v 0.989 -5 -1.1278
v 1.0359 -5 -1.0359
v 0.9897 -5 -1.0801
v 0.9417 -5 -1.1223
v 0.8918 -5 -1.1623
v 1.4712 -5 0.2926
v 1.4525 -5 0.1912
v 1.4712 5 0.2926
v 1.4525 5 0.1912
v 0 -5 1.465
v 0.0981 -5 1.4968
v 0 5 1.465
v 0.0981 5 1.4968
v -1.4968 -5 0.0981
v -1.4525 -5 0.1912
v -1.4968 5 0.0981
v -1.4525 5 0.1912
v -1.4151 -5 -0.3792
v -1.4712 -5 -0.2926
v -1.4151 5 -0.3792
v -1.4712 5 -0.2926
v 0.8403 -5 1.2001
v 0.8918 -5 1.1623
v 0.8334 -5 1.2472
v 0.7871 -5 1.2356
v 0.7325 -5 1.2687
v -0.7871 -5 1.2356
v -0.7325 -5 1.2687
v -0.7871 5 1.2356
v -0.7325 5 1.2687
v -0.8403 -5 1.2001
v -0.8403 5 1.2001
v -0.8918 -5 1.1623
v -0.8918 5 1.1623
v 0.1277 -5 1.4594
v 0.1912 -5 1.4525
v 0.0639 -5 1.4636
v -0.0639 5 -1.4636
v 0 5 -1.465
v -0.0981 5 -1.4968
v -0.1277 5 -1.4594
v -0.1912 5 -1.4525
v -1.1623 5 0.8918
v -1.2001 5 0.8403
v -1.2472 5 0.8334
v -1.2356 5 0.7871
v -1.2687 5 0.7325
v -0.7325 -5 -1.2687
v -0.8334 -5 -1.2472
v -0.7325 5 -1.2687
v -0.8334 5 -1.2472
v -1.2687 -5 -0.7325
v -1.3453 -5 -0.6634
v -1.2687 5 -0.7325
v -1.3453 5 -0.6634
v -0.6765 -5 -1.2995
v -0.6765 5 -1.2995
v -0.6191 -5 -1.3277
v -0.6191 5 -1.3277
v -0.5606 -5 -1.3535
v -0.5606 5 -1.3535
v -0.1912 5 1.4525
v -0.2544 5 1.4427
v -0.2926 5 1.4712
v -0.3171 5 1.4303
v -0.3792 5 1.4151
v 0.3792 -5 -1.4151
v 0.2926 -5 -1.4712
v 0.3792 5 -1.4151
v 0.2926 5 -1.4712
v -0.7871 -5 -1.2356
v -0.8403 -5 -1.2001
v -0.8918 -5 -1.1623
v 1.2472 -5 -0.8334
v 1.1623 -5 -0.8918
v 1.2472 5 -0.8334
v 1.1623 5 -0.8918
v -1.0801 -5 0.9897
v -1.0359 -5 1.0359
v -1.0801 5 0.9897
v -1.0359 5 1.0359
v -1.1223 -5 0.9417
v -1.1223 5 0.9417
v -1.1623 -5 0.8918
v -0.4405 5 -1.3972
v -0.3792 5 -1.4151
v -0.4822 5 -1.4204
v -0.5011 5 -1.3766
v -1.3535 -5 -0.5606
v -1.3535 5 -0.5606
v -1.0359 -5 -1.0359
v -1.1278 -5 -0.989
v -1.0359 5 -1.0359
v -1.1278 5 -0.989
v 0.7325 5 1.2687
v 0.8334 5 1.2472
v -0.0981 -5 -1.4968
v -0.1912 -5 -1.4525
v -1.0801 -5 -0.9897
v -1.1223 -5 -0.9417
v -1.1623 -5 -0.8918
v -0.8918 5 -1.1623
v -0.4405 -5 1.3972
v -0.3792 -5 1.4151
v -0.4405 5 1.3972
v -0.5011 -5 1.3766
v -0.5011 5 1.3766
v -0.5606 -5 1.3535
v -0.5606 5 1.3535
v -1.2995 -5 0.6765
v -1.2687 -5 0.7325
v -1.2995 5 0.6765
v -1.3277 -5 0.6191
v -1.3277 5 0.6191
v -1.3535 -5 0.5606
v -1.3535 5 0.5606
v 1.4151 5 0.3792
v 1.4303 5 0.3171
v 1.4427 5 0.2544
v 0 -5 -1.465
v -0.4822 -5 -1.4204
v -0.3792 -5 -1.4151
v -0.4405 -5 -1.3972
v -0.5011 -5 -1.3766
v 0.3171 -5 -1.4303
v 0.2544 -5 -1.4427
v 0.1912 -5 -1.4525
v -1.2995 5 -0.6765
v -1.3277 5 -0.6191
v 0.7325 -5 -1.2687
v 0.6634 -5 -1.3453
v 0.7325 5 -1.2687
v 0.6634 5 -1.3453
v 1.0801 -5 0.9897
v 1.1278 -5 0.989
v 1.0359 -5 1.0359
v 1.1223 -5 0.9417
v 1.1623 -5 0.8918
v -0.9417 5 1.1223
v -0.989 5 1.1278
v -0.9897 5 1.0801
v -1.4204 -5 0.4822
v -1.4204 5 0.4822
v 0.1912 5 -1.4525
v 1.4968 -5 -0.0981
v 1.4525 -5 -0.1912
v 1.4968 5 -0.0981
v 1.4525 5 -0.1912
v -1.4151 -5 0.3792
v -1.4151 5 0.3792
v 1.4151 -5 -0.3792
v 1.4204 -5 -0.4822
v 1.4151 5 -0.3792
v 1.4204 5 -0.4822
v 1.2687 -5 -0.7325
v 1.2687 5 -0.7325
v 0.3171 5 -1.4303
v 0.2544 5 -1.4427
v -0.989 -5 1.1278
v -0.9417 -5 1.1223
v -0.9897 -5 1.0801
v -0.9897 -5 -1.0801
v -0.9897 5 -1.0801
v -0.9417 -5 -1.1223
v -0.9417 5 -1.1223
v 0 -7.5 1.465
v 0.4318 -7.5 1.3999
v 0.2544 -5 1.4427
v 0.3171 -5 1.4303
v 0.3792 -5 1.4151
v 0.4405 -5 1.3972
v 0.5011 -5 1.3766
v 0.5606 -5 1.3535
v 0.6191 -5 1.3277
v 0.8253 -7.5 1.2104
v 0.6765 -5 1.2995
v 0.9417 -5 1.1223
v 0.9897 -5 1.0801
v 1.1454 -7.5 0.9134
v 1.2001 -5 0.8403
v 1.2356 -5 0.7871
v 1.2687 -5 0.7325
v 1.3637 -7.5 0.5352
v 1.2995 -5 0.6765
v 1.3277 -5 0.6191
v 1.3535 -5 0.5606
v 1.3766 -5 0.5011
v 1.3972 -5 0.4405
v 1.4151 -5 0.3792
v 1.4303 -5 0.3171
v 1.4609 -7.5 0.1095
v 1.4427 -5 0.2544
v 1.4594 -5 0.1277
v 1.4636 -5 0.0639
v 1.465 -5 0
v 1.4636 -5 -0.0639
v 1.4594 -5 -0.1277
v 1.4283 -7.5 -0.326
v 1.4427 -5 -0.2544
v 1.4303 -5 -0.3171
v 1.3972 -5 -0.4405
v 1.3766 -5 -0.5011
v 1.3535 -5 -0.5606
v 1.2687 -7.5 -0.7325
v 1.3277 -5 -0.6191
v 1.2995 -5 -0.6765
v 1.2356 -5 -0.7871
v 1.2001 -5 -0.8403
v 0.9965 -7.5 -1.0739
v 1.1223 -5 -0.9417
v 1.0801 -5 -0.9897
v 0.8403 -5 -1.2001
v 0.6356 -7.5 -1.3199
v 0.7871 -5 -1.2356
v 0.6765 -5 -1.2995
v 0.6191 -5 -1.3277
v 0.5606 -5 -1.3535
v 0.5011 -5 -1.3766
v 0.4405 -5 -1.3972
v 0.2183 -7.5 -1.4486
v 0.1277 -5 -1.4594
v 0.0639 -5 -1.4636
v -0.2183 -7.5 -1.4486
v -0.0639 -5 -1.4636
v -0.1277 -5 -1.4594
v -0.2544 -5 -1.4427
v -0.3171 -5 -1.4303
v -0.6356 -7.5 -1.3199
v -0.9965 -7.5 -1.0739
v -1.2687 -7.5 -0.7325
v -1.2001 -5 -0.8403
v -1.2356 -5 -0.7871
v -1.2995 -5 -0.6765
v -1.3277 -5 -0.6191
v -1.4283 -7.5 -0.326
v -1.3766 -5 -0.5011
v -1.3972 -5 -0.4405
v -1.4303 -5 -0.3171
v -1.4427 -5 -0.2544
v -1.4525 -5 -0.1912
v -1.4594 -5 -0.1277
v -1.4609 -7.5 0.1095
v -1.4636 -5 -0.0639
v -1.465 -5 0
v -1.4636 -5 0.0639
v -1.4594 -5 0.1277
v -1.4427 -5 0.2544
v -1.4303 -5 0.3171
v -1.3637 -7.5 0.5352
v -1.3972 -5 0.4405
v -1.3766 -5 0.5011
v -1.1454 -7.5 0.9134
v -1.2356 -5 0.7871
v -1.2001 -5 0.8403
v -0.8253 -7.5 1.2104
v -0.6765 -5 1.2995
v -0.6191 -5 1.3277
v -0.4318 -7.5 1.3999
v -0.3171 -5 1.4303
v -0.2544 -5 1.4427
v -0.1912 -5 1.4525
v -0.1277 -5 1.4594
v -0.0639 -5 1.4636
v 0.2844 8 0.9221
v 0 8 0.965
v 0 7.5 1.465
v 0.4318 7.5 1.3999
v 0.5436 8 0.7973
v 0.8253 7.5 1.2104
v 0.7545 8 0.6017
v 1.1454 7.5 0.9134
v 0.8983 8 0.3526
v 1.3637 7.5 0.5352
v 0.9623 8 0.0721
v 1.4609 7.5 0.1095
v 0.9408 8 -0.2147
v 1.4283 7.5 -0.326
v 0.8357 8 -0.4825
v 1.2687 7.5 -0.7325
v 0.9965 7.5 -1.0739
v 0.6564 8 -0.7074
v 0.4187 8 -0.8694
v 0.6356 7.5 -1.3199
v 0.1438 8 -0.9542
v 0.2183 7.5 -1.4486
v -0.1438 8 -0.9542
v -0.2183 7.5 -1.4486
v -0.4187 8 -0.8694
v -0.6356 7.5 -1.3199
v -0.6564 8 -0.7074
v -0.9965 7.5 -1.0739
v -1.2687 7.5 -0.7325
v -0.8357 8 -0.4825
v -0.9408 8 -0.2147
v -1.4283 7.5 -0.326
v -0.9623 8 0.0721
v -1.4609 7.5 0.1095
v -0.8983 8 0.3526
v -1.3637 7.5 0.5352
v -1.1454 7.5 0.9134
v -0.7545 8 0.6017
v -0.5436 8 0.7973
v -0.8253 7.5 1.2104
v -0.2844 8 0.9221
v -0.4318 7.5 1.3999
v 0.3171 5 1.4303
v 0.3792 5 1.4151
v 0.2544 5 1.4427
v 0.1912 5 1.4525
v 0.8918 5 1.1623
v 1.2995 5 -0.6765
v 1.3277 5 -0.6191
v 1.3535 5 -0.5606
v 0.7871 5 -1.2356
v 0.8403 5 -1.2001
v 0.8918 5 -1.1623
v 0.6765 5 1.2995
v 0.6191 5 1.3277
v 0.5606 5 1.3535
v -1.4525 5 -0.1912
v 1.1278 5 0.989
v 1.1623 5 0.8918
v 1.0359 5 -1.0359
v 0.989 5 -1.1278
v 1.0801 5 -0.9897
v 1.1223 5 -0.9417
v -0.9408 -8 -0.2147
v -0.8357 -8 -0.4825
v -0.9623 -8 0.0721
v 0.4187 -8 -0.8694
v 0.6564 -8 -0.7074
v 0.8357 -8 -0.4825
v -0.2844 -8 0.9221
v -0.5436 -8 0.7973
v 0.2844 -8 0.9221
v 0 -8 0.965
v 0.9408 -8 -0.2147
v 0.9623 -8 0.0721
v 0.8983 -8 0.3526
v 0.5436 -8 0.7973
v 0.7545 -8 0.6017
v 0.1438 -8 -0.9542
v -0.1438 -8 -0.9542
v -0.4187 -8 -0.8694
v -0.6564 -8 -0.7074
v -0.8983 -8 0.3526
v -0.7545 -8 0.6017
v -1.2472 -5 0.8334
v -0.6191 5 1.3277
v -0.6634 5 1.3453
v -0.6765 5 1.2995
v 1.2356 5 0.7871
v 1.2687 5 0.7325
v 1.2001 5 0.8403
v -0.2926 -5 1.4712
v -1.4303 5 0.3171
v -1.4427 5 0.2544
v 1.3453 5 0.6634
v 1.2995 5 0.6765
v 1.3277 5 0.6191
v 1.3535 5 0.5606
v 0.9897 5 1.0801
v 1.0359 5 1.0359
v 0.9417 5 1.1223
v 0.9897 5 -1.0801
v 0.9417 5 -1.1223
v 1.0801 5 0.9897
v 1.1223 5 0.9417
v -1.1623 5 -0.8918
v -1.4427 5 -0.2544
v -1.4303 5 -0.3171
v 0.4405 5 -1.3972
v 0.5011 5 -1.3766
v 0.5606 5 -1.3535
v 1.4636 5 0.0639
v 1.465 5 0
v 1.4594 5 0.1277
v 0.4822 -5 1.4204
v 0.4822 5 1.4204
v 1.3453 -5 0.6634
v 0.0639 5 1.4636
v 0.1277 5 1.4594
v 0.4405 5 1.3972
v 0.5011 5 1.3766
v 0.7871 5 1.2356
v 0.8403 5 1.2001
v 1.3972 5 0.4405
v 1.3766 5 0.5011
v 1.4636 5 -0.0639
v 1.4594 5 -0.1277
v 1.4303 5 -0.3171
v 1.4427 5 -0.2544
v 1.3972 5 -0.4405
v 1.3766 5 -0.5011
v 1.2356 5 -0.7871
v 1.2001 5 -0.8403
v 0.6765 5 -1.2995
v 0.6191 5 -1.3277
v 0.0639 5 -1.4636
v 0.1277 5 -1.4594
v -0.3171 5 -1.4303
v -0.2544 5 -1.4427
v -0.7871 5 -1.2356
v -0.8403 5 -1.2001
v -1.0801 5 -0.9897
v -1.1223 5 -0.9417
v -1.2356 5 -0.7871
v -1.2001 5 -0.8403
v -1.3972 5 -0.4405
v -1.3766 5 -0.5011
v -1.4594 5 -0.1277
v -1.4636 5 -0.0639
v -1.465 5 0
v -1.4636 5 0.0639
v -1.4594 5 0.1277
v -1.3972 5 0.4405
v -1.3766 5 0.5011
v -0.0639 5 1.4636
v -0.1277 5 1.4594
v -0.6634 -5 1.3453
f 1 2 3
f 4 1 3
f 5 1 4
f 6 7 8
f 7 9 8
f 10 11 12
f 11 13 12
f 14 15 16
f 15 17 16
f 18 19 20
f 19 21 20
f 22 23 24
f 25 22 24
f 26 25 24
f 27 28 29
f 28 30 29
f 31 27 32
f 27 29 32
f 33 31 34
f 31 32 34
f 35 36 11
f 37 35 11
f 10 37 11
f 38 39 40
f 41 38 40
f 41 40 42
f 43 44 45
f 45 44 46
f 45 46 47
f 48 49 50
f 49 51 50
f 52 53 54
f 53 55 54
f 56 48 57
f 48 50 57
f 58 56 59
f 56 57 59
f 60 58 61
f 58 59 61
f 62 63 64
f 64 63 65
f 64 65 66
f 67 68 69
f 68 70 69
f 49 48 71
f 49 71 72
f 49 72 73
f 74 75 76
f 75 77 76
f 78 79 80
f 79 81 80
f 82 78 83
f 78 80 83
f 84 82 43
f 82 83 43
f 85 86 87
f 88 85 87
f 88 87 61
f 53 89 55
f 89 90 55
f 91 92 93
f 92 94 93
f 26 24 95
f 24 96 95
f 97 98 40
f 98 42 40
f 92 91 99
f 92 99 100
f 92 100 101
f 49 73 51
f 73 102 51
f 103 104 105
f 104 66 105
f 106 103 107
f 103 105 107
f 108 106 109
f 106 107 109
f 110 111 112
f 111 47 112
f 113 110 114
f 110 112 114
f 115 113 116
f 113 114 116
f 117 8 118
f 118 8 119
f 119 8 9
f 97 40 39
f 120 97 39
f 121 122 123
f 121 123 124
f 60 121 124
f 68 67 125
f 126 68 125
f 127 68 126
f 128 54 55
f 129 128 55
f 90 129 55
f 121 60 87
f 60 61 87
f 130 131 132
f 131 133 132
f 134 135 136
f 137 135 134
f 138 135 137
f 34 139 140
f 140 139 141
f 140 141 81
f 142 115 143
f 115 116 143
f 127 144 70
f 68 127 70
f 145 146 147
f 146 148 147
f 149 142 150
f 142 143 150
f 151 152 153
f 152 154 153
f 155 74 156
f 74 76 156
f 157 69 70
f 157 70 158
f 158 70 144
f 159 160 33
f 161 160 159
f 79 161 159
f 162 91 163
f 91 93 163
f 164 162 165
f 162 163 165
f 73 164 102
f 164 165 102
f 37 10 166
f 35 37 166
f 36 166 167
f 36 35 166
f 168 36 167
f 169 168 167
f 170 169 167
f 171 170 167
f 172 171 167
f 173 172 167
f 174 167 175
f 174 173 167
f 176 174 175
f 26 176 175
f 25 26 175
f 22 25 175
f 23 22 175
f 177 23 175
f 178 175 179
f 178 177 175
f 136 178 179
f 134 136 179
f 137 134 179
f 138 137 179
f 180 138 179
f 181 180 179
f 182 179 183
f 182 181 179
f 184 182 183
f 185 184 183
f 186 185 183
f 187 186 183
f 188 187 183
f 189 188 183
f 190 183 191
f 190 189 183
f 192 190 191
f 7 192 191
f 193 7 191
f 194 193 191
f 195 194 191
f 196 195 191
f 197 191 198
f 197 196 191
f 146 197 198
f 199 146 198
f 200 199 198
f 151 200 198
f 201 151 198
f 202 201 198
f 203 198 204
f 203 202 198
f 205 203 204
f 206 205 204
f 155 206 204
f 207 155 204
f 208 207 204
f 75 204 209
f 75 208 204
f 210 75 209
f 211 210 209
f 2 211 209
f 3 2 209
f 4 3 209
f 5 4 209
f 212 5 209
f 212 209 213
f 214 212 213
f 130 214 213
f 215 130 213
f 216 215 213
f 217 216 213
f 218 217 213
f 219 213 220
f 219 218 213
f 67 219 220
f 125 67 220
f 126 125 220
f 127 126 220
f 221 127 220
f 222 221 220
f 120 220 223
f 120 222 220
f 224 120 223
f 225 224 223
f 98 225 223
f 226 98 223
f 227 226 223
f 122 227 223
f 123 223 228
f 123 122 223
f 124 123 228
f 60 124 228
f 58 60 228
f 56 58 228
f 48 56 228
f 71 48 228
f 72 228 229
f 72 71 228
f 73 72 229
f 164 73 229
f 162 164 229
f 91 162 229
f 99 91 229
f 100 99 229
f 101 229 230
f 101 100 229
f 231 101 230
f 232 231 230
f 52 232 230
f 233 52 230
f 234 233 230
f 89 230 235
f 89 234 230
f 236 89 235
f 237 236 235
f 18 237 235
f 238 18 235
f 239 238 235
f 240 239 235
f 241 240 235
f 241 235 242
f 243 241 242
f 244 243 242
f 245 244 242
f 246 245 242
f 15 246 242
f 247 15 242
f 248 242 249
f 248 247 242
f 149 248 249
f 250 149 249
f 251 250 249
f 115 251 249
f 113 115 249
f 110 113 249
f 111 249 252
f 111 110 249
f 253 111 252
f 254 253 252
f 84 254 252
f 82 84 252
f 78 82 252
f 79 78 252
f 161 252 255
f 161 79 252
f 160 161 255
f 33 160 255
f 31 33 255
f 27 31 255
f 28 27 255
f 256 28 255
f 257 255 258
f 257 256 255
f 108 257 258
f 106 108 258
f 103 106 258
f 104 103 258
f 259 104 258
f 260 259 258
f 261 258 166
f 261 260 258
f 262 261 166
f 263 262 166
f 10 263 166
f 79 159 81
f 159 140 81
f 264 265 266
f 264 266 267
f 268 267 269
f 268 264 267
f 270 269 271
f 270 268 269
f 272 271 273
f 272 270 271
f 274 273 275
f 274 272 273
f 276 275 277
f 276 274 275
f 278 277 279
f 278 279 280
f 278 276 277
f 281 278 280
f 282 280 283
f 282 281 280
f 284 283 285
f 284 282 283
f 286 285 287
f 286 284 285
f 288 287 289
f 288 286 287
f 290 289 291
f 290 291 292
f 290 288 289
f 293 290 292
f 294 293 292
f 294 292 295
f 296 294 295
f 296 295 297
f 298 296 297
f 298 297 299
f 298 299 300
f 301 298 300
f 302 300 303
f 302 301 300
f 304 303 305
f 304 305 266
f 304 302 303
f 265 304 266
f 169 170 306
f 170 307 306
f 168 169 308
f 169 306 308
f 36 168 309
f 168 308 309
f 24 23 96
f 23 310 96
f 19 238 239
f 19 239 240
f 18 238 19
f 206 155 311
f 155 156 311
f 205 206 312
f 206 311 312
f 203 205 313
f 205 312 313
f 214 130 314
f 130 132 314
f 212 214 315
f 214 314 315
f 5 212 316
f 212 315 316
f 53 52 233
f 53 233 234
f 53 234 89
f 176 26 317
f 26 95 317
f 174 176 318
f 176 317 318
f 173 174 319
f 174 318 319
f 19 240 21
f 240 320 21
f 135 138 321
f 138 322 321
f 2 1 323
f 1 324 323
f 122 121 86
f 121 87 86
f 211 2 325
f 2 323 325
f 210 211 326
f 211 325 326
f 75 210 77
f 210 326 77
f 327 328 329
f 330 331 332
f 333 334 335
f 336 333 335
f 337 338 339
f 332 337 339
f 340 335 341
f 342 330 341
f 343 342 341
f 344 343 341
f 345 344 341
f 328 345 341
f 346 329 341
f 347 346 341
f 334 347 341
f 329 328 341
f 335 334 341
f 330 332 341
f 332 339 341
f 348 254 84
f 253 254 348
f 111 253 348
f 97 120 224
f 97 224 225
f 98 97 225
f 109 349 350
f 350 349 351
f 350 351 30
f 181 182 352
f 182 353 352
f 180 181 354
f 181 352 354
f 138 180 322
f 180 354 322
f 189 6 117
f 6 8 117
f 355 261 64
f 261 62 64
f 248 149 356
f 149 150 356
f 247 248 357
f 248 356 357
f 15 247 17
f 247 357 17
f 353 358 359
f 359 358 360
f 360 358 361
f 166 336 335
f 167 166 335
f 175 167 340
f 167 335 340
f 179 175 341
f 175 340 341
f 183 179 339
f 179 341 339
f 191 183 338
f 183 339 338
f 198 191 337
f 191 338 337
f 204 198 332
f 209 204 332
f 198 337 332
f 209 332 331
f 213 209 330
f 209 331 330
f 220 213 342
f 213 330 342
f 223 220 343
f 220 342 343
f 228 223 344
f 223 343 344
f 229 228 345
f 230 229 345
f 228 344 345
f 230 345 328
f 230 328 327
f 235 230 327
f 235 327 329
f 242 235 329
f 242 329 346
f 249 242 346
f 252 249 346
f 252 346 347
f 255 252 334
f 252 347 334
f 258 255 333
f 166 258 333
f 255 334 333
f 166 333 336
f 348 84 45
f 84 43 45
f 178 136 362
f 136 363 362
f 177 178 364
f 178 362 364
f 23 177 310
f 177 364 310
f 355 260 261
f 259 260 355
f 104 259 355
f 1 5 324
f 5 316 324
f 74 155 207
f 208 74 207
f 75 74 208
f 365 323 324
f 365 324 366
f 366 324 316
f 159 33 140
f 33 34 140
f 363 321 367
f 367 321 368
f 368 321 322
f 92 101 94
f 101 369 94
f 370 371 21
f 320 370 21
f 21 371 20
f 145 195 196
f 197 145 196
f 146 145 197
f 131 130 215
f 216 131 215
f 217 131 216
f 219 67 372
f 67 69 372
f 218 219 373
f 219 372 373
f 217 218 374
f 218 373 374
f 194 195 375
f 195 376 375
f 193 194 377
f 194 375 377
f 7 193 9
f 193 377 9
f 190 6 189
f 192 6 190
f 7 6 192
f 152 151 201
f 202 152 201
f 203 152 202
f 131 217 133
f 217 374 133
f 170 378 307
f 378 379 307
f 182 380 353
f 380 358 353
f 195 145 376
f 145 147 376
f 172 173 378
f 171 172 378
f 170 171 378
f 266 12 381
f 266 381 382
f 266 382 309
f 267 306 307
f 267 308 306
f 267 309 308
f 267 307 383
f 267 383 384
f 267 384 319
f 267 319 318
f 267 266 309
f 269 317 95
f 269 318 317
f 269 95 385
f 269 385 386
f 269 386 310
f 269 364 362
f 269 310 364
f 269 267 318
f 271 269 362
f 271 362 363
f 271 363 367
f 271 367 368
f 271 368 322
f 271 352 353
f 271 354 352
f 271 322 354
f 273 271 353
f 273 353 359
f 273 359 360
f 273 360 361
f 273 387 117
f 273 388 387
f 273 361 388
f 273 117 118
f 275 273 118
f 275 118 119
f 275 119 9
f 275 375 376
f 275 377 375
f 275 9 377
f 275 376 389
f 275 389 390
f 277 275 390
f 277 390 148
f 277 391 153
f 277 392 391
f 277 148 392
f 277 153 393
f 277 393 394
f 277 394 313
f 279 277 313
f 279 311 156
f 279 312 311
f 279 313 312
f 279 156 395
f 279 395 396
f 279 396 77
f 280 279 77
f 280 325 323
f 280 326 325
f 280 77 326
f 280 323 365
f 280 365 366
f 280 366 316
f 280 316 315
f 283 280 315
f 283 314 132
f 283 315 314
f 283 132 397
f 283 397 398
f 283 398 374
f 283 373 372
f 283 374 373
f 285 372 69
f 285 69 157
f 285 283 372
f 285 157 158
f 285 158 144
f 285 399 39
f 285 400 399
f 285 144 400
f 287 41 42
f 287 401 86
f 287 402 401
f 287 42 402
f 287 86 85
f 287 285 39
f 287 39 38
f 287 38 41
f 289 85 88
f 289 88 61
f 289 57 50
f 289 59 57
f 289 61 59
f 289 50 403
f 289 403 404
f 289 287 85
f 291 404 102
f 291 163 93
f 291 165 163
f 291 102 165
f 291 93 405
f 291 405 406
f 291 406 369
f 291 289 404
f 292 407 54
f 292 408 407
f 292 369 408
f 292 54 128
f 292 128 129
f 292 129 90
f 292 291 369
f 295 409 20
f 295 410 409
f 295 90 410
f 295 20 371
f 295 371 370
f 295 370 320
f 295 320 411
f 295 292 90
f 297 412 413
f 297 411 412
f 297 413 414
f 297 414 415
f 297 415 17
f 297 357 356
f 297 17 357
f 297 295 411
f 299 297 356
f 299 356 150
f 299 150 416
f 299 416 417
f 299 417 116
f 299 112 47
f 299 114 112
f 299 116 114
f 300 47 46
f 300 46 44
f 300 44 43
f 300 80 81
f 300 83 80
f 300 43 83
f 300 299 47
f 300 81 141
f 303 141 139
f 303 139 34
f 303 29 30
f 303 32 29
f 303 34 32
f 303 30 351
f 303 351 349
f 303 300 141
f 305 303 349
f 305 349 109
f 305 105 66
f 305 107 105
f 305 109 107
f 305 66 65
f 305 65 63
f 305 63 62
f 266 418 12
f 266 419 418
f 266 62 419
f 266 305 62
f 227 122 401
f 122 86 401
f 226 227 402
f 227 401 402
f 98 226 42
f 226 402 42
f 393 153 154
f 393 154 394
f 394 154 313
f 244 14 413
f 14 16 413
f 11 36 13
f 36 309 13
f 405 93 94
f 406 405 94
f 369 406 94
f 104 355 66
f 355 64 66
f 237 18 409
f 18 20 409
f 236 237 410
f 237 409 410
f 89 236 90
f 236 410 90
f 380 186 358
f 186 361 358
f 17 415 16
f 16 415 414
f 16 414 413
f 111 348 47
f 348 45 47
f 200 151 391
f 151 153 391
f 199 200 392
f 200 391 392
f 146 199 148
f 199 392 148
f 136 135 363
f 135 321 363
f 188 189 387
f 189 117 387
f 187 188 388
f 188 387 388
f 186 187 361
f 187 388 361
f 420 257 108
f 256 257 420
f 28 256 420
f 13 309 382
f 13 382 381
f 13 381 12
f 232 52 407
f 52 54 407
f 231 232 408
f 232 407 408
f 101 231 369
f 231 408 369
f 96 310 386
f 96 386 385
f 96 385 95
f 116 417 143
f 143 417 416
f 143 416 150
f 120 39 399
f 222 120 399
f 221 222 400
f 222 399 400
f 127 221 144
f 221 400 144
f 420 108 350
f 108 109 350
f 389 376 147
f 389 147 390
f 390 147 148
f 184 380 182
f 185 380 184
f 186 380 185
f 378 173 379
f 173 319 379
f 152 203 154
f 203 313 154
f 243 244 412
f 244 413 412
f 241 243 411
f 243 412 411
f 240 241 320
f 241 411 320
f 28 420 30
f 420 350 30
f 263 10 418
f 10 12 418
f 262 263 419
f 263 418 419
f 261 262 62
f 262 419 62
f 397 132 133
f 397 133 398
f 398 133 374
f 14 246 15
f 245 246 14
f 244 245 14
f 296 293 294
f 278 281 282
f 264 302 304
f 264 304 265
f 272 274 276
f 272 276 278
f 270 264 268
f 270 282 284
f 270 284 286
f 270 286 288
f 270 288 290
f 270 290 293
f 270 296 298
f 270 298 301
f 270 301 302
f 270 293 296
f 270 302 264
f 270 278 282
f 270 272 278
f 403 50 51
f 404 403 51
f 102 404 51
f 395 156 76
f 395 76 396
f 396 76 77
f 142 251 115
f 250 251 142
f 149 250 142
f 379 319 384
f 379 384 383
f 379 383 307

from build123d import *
from build123d.topology import SkipClean

# Parameters (mm, degrees)
SKETCH1_R      = 1.465
EXTRUDE1_DEPTH = 8
CHAMFER1_SIZE  = 0.5
EXTRUDE2_DEPTH = 5


with BuildPart() as part:
    # Sketch1 → Extrude1 (new, symmetric)
    with BuildSketch(Plane(origin=(0, 0, 0), x_dir=(1, 0, 0), z_dir=(0, 1, 0))):
        with Locations(Location((0, 0, 0), (0, 0, 270))):
            Circle(SKETCH1_R)
    extrude(amount=EXTRUDE1_DEPTH, both=True)

    # Chamfer1
    chamfer1_edges = [part.edges().sort_by_distance(p)[0] for p in [
        (0, -8, -1.465),
        (0, 8, -1.465),
    ]]
    chamfer(chamfer1_edges, length=CHAMFER1_SIZE)

    # Sketch2 → Extrude2 (add, symmetric)
    with SkipClean():  # the faces are left unmerged after this step: merging them gives an invalid solid
        with BuildSketch(Plane(origin=(0, 0, 0), x_dir=(1, 0, 0), z_dir=(0, 1, 0))):
            with BuildLine():
                Line((0.191220872, 1.452466722), (0.292635483, 1.471177921))
                Line((0.292635483, 1.471177921), (0.379169901, 1.415081336))
                ThreePointArc((0.379169901, 1.415081336), (0.470908817, 1.38725264), (0.560631228, 1.353483515))
                Line((0.560631228, 1.353483515), (0.663433035, 1.345309112))
                Line((0.663433035, 1.345309112), (0.7325, 1.268727217))
                ThreePointArc((0.7325, 1.268727217), (0.813910391, 1.218102982), (0.891835493, 1.162262644))
                Line((0.891835493, 1.162262644), (0.989018723, 1.127759711))
                Line((0.989018723, 1.127759711), (1.035911434, 1.035911434))
                ThreePointArc((1.035911434, 1.035911434), (1.101445318, 0.965941619), (1.162262644, 0.891835493))
                Line((1.162262644, 0.891835493), (1.247204418, 0.83335535))
                Line((1.247204418, 0.83335535), (1.268727217, 0.7325))
                ThreePointArc((1.268727217, 0.7325), (1.313918566, 0.647952931), (1.353483515, 0.560631228))
                Line((1.353483515, 0.560631228), (1.420395194, 0.482159198))
                Line((1.420395194, 0.482159198), (1.415081336, 0.379169901))
                ThreePointArc((1.415081336, 0.379169901), (1.436850436, 0.285807322), (1.452466722, 0.191220872))
                Line((1.452466722, 0.191220872), (1.496788385, 0.098104694))
                Line((1.496788385, 0.098104694), (1.465, 0))
                ThreePointArc((1.465, 0), (1.461863323, -0.095815584), (1.452466722, -0.191220872))
                Line((1.452466722, -0.191220872), (1.471177921, -0.292635483))
                Line((1.471177921, -0.292635483), (1.415081336, -0.379169901))
                ThreePointArc((1.415081336, -0.379169901), (1.38725264, -0.470908817), (1.353483515, -0.560631228))
                Line((1.353483515, -0.560631228), (1.345309112, -0.663433035))
                Line((1.345309112, -0.663433035), (1.268727217, -0.7325))
                ThreePointArc((1.268727217, -0.7325), (1.218102982, -0.813910391), (1.162262644, -0.891835493))
                Line((1.162262644, -0.891835493), (1.127759711, -0.989018723))
                Line((1.127759711, -0.989018723), (1.035911434, -1.035911434))
                ThreePointArc((1.035911434, -1.035911434), (0.965941619, -1.101445318), (0.891835493, -1.162262644))
                Line((0.891835493, -1.162262644), (0.83335535, -1.247204418))
                Line((0.83335535, -1.247204418), (0.7325, -1.268727217))
                ThreePointArc((0.7325, -1.268727217), (0.647952931, -1.313918566), (0.560631228, -1.353483515))
                Line((0.560631228, -1.353483515), (0.482159198, -1.420395194))
                Line((0.482159198, -1.420395194), (0.379169901, -1.415081336))
                ThreePointArc((0.379169901, -1.415081336), (0.285807322, -1.436850436), (0.191220872, -1.452466722))
                Line((0.191220872, -1.452466722), (0.098104694, -1.496788385))
                Line((0.098104694, -1.496788385), (0, -1.465))
                ThreePointArc((0, -1.465), (-0.095815584, -1.461863323), (-0.191220872, -1.452466722))
                Line((-0.191220872, -1.452466722), (-0.292635483, -1.471177921))
                Line((-0.292635483, -1.471177921), (-0.379169901, -1.415081336))
                ThreePointArc((-0.379169901, -1.415081336), (-0.470908817, -1.38725264), (-0.560631228, -1.353483515))
                Line((-0.560631228, -1.353483515), (-0.663433035, -1.345309112))
                Line((-0.663433035, -1.345309112), (-0.7325, -1.268727217))
                ThreePointArc((-0.7325, -1.268727217), (-0.813910391, -1.218102982), (-0.891835493, -1.162262644))
                Line((-0.891835493, -1.162262644), (-0.989018723, -1.127759711))
                Line((-0.989018723, -1.127759711), (-1.035911434, -1.035911434))
                ThreePointArc((-1.035911434, -1.035911434), (-1.101445318, -0.965941619), (-1.162262644, -0.891835493))
                Line((-1.162262644, -0.891835493), (-1.247204418, -0.83335535))
                Line((-1.247204418, -0.83335535), (-1.268727217, -0.7325))
                ThreePointArc((-1.268727217, -0.7325), (-1.313918566, -0.647952931), (-1.353483515, -0.560631228))
                Line((-1.353483515, -0.560631228), (-1.420395194, -0.482159198))
                Line((-1.420395194, -0.482159198), (-1.415081336, -0.379169901))
                ThreePointArc((-1.415081336, -0.379169901), (-1.436850436, -0.285807322), (-1.452466722, -0.191220872))
                Line((-1.452466722, -0.191220872), (-1.496788385, -0.098104694))
                Line((-1.496788385, -0.098104694), (-1.465, 0))
                ThreePointArc((-1.465, 0), (-1.461863323, 0.095815584), (-1.452466722, 0.191220872))
                Line((-1.452466722, 0.191220872), (-1.471177921, 0.292635483))
                Line((-1.471177921, 0.292635483), (-1.415081336, 0.379169901))
                ThreePointArc((-1.415081336, 0.379169901), (-1.38725264, 0.470908817), (-1.353483515, 0.560631228))
                Line((-1.353483515, 0.560631228), (-1.345309112, 0.663433035))
                Line((-1.345309112, 0.663433035), (-1.268727217, 0.7325))
                ThreePointArc((-1.268727217, 0.7325), (-1.218102982, 0.813910391), (-1.162262644, 0.891835493))
                Line((-1.162262644, 0.891835493), (-1.127759711, 0.989018723))
                Line((-1.127759711, 0.989018723), (-1.035911434, 1.035911434))
                ThreePointArc((-1.035911434, 1.035911434), (-0.965941619, 1.101445318), (-0.891835493, 1.162262644))
                Line((-0.891835493, 1.162262644), (-0.83335535, 1.247204418))
                Line((-0.83335535, 1.247204418), (-0.7325, 1.268727217))
                ThreePointArc((-0.7325, 1.268727217), (-0.647952931, 1.313918566), (-0.560631228, 1.353483515))
                Line((-0.560631228, 1.353483515), (-0.482159198, 1.420395194))
                Line((-0.482159198, 1.420395194), (-0.379169901, 1.415081336))
                ThreePointArc((-0.379169901, 1.415081336), (-0.285807322, 1.436850436), (-0.191220872, 1.452466722))
                Line((-0.191220872, 1.452466722), (-0.098104694, 1.496788385))
                Line((-0.098104694, 1.496788385), (0, 1.465))
                ThreePointArc((0, 1.465), (0.095815584, 1.461863323), (0.191220872, 1.452466722))
            make_face()
        extrude(amount=EXTRUDE2_DEPTH, both=True)


solid = part.part
